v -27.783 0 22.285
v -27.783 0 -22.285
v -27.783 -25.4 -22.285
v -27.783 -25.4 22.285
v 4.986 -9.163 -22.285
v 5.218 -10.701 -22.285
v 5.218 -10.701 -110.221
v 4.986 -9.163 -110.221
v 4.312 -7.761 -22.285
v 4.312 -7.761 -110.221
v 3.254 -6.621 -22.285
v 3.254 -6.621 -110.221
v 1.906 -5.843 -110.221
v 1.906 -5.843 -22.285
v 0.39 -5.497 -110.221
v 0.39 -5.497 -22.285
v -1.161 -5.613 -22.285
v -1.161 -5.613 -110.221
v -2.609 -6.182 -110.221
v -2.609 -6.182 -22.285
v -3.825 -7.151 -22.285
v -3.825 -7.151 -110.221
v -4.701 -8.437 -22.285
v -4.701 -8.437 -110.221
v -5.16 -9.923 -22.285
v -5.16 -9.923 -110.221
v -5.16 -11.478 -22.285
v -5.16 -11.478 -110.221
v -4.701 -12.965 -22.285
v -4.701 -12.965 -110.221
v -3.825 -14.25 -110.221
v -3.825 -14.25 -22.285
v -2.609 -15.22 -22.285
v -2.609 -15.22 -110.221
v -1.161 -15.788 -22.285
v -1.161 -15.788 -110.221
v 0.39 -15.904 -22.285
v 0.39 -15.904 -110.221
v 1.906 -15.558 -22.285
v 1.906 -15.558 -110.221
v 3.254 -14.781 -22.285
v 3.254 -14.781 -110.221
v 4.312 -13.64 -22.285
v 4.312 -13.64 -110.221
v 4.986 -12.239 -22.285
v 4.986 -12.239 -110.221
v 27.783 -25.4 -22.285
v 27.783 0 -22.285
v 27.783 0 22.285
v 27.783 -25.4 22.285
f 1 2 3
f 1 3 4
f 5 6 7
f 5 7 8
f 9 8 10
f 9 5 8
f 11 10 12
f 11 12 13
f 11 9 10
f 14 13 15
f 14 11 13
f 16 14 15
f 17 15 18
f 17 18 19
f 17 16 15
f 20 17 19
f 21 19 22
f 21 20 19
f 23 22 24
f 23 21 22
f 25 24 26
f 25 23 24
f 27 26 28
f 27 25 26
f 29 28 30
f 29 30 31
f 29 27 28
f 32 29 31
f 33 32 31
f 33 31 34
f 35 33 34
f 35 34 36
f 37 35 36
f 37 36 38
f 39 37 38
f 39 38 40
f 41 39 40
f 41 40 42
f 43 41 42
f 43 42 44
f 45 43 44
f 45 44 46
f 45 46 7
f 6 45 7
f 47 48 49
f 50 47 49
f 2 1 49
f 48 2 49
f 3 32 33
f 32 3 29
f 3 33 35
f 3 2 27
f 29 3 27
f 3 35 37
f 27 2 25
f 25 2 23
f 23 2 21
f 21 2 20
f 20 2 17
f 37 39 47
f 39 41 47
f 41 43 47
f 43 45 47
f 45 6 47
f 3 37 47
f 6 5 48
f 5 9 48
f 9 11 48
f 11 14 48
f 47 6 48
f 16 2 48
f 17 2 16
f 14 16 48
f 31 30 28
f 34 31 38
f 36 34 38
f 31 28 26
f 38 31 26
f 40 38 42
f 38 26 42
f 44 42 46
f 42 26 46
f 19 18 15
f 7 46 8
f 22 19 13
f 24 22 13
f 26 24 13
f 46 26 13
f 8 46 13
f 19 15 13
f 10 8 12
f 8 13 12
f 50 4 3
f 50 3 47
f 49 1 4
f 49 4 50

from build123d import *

# Parameters (mm, degrees)
F0_W     = 55.56523
F0_H     = 44.569992
F1_DEPTH = 25.4
F2_R     = 5.218262
F3_DEPTH = 110.220805


with BuildPart() as f1:
    # F0 (on Front) → F1 (new body)
    with BuildSketch(Plane.XZ):
        Rectangle(F0_W, F0_H)
    extrude(amount=F1_DEPTH)

    # F2 (on Top) → F3 (join)
    with BuildSketch(Plane.XY):
        with Locations((0, -10.700724)):
            Circle(F2_R)
    extrude(amount=-F3_DEPTH)


solid = f1.part
